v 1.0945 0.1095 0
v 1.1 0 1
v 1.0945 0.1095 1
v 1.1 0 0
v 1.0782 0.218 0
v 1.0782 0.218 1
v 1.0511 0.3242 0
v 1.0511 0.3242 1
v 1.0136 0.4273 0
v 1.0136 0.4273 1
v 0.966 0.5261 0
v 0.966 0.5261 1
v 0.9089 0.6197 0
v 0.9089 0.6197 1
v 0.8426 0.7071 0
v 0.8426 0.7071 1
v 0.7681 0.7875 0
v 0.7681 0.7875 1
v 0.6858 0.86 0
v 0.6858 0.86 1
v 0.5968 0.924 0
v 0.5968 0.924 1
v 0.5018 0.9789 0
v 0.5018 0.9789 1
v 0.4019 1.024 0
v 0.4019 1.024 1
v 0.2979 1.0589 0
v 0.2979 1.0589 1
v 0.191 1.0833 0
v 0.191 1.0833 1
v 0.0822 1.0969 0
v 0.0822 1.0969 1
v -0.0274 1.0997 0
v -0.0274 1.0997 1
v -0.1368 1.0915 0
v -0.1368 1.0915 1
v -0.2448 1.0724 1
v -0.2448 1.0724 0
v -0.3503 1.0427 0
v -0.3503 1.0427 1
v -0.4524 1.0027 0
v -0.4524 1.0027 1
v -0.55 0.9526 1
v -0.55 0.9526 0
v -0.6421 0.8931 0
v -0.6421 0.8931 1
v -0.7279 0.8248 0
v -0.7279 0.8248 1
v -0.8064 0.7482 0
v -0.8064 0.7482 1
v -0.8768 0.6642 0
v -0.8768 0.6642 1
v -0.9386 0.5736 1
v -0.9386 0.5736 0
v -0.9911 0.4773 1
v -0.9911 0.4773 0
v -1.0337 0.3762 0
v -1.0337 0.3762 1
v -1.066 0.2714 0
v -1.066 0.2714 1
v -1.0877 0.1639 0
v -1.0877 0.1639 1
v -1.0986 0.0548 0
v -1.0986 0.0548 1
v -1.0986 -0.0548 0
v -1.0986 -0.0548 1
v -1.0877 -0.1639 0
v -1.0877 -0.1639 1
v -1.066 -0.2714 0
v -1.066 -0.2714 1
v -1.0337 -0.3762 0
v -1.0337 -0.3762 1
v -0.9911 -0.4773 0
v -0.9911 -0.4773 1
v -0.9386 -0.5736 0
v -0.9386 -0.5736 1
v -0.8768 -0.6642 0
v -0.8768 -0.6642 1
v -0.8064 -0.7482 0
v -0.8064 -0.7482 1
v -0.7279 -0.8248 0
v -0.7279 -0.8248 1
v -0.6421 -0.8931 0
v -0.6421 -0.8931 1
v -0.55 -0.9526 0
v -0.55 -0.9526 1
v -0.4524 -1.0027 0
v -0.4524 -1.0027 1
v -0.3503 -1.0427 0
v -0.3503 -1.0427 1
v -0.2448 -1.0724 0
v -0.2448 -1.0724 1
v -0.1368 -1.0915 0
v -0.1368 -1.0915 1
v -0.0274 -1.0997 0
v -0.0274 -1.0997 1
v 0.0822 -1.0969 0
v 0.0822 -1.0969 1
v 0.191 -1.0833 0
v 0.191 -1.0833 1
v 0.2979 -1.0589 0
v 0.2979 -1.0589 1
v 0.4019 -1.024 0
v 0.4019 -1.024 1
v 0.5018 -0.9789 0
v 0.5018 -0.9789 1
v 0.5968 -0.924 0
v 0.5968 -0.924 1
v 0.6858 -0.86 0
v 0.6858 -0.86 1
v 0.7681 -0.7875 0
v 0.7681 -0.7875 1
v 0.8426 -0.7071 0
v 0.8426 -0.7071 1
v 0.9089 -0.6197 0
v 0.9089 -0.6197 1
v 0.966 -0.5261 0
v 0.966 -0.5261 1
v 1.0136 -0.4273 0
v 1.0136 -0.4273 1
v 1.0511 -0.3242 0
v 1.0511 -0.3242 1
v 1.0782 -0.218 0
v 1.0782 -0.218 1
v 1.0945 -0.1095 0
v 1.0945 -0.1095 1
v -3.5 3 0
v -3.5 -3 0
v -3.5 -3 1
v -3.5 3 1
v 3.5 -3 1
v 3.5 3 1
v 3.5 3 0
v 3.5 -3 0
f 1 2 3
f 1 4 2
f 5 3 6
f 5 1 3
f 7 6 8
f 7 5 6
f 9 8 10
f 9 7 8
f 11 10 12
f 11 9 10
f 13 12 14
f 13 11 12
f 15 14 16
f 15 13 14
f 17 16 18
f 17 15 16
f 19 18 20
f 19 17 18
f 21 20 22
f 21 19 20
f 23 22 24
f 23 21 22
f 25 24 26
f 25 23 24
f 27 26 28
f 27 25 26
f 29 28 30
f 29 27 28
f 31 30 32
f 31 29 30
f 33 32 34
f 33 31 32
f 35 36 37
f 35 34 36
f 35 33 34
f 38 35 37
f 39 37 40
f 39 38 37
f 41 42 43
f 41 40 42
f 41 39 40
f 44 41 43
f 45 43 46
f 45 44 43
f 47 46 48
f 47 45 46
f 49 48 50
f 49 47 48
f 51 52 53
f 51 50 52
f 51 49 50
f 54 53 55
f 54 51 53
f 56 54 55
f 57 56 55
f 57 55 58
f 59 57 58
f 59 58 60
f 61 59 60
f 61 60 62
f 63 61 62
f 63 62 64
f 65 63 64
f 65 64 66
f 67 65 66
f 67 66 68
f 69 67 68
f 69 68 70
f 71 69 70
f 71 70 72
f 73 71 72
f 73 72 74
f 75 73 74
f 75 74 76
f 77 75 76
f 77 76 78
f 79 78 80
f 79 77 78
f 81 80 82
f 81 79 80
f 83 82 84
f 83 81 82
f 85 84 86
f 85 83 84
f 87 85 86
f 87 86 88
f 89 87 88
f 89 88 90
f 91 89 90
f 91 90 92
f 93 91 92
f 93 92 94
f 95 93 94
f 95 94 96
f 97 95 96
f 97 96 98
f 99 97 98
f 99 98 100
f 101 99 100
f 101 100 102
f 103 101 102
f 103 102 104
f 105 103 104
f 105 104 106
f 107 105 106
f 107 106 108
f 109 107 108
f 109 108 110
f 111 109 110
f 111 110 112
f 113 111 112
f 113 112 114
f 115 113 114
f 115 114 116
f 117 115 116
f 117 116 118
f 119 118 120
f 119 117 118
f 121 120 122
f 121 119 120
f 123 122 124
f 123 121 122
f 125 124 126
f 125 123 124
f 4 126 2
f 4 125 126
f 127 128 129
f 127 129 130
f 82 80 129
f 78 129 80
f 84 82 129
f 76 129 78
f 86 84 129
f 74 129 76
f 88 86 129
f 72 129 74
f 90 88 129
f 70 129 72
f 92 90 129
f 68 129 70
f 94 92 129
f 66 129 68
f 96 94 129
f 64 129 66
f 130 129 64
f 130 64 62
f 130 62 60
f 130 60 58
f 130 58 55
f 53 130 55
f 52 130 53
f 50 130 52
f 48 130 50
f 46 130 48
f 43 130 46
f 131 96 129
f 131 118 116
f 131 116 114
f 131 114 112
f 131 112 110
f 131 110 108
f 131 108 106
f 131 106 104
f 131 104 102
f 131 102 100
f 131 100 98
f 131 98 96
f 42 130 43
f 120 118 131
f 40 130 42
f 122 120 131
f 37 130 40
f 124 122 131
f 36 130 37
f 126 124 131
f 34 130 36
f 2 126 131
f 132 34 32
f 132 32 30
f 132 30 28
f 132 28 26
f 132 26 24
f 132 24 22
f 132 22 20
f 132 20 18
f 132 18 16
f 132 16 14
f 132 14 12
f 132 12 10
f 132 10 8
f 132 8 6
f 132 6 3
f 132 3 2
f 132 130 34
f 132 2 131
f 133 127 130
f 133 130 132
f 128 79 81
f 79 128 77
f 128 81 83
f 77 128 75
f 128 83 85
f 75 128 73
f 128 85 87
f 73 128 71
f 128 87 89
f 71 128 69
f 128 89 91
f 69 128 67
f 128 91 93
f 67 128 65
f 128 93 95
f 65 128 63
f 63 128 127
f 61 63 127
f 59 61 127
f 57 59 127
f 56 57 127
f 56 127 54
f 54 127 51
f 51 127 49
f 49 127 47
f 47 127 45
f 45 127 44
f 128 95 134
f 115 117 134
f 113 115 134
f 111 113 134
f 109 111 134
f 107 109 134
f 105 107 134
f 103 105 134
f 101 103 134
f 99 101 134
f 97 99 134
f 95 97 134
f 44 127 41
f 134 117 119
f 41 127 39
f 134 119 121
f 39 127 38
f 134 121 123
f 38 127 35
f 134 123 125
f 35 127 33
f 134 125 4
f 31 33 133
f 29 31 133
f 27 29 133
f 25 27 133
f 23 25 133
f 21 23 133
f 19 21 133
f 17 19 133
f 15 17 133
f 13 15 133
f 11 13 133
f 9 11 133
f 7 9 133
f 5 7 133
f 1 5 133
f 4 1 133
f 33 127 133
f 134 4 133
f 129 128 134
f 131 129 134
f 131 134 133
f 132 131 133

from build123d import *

# Parameters (mm, degrees)
CLAMP_OUTLINE_SKETCH_W = 7
CLAMP_OUTLINE_SKETCH_H = 6
CLAMP_OUTLINE_DEPTH    = 1
M2_CLEARANCE_SKETCH_R  = 1.1
M2_CLEARANCE_DEPTH     = 1.2


with BuildPart() as part:
    # Clamp Outline Sketch → Clamp Outline (new body)
    with BuildSketch(Plane.XY):
        Rectangle(CLAMP_OUTLINE_SKETCH_W, CLAMP_OUTLINE_SKETCH_H)
    extrude(amount=CLAMP_OUTLINE_DEPTH)

    # M2 Clearance Sketch → M2 Clearance (cut)
    with BuildSketch(Plane.XY.offset(-0.1)):
        Circle(M2_CLEARANCE_SKETCH_R)
    extrude(amount=M2_CLEARANCE_DEPTH, mode=Mode.SUBTRACT)


solid = part.part
